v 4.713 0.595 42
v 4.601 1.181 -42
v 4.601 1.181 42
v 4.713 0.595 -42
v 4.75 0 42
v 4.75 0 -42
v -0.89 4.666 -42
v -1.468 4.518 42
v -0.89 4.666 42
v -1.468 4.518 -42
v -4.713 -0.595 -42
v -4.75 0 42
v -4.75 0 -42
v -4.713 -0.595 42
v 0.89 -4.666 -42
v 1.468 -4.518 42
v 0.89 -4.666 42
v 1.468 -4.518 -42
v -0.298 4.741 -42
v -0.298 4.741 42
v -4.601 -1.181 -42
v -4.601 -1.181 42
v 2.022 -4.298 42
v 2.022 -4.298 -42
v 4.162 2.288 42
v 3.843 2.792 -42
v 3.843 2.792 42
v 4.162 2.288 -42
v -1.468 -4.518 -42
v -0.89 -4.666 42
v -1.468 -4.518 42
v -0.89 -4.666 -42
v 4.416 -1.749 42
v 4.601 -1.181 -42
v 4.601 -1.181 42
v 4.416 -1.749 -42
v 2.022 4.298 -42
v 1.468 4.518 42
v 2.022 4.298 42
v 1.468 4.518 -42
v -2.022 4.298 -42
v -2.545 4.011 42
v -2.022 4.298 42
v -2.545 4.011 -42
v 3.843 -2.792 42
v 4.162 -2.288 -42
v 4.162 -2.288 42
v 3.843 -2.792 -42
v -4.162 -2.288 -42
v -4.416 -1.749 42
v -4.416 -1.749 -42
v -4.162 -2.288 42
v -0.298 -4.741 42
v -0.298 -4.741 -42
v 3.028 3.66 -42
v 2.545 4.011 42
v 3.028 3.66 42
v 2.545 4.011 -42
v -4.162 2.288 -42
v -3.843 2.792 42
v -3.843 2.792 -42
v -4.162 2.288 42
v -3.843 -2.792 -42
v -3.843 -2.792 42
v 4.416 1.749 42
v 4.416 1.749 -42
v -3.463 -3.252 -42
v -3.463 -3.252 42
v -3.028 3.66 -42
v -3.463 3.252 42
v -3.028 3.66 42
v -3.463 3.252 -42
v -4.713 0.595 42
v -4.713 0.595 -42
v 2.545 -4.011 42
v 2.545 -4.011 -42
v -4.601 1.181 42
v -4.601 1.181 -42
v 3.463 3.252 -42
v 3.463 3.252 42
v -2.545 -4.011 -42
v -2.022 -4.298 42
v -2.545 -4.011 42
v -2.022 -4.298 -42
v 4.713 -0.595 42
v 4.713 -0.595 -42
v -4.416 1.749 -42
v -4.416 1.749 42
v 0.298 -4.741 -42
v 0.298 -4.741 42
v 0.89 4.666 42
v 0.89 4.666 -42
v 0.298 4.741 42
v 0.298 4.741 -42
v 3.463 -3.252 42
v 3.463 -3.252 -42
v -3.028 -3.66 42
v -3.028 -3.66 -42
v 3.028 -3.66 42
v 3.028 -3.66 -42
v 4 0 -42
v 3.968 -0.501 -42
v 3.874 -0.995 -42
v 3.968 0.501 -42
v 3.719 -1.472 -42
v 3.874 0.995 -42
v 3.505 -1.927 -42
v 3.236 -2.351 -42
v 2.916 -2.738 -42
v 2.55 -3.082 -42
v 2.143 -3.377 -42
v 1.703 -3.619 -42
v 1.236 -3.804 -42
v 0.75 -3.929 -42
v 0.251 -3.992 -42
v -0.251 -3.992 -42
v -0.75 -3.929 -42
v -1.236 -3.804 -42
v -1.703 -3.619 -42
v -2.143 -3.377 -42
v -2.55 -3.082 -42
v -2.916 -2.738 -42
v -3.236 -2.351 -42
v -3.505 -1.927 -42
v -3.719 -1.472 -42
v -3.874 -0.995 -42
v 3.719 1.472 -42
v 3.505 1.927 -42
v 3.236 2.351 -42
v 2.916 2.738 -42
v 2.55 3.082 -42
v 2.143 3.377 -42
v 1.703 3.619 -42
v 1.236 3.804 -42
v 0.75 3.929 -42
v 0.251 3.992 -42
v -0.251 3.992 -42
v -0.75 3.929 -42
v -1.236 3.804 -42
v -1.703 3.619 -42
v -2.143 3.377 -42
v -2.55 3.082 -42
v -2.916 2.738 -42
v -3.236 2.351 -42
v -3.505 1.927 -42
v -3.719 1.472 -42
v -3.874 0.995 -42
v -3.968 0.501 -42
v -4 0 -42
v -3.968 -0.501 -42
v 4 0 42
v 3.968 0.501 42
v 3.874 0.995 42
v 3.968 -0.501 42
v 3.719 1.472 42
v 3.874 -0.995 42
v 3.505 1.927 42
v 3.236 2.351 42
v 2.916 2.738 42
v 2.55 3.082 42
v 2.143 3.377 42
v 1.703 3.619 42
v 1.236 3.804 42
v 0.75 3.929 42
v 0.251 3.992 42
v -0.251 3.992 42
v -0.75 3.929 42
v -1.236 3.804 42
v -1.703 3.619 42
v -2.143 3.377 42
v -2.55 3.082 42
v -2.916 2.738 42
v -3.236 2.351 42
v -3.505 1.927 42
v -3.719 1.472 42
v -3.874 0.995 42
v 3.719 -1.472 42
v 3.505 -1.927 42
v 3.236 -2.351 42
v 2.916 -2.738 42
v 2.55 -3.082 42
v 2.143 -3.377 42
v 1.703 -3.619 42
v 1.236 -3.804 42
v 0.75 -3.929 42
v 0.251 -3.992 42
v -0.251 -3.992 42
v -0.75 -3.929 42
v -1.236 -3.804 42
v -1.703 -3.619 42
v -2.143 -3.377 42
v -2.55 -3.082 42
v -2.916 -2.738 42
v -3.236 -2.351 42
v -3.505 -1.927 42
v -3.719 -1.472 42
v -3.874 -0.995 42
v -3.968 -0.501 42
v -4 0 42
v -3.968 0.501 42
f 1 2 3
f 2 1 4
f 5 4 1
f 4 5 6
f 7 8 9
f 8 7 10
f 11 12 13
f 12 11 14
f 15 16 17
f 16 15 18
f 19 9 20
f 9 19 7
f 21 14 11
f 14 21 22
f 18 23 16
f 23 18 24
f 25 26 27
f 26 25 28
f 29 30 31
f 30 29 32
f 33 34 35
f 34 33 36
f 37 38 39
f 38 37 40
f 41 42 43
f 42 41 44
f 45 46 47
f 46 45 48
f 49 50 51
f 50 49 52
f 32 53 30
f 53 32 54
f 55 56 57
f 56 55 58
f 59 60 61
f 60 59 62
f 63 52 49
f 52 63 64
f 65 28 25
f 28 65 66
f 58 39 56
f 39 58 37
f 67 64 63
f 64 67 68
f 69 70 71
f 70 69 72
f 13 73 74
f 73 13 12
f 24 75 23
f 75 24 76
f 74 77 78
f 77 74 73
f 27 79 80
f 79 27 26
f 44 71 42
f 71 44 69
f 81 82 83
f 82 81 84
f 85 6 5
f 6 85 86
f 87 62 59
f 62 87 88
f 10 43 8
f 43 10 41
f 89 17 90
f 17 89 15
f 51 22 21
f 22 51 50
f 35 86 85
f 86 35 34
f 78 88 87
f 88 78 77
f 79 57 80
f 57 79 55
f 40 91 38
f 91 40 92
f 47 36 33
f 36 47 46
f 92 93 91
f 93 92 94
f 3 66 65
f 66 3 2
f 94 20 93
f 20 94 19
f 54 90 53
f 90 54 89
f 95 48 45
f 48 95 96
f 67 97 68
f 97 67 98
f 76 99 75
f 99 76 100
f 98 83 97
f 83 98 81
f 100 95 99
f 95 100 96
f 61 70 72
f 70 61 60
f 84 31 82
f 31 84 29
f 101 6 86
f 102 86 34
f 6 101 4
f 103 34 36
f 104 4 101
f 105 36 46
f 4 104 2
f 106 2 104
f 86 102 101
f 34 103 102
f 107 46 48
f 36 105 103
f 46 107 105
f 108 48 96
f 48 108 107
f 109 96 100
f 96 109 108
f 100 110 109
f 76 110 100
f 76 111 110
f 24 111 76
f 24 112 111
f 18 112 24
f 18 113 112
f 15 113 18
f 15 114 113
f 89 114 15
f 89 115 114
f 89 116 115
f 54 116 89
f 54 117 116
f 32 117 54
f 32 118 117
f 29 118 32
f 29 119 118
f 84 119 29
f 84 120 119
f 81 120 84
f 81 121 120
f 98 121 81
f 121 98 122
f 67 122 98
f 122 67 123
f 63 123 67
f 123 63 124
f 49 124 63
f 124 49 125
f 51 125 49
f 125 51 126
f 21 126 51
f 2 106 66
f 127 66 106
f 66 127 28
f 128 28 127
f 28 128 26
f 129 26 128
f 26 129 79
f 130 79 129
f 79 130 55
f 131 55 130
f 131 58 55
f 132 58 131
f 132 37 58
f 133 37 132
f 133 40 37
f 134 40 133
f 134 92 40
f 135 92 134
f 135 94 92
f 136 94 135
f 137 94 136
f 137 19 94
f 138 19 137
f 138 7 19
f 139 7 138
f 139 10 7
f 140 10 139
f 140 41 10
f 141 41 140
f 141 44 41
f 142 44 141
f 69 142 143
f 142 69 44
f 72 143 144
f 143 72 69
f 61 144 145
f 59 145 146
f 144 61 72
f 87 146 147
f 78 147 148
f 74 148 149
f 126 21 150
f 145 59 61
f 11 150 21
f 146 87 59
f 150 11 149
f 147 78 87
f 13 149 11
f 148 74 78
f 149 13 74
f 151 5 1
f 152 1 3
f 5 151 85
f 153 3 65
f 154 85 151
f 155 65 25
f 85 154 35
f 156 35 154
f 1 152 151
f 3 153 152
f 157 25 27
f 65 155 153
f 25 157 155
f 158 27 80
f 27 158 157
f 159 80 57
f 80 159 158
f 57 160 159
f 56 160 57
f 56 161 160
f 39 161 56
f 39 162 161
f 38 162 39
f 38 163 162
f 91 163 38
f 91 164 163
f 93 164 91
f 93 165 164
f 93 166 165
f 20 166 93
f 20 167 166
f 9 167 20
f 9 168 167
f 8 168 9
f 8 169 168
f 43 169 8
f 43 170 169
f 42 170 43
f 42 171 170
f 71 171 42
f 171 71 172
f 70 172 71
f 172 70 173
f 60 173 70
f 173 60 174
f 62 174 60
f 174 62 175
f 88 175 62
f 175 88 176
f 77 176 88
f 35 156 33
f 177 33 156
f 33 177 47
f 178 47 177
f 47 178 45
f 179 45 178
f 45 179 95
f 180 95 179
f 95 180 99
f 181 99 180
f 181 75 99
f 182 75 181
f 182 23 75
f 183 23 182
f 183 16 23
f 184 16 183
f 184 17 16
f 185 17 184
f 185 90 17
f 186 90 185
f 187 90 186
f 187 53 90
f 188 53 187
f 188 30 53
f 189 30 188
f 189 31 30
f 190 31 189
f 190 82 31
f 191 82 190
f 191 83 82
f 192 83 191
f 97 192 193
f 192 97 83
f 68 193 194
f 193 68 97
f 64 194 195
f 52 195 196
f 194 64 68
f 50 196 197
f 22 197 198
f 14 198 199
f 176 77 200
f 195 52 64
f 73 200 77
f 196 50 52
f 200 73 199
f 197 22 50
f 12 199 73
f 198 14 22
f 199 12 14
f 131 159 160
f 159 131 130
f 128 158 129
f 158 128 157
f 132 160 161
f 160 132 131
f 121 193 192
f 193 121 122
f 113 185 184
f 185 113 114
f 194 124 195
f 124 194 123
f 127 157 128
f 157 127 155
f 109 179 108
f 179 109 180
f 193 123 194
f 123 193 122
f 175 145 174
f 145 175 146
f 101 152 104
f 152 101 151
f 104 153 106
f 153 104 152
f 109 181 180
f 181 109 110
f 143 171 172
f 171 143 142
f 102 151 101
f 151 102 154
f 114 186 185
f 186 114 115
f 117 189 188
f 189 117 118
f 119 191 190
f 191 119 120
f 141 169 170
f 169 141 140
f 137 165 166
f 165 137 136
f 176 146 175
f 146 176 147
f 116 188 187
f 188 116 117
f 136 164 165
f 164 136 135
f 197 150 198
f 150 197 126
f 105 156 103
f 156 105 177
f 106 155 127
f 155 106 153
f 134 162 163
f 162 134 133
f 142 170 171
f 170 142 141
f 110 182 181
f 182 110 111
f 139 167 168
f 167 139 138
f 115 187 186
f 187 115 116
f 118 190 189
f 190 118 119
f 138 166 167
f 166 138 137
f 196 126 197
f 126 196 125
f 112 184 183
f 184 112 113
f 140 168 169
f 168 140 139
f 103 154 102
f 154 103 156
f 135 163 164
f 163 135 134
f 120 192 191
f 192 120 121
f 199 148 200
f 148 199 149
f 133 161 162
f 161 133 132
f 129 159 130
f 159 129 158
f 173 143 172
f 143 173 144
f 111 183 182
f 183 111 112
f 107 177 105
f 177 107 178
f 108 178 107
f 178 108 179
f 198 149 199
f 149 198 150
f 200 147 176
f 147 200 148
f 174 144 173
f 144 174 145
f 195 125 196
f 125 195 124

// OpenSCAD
$fn = 50;


difference() {
	union() {
		translate(v = [0, 0, -42.0000000000]) {
			cylinder(h = 84, r = 4.7500000000);
		}
	}
	union() {
		translate(v = [0, 0, -100.0000000000]) {
			cylinder(h = 200, r = 4.0000000000);
		}
	}
}
